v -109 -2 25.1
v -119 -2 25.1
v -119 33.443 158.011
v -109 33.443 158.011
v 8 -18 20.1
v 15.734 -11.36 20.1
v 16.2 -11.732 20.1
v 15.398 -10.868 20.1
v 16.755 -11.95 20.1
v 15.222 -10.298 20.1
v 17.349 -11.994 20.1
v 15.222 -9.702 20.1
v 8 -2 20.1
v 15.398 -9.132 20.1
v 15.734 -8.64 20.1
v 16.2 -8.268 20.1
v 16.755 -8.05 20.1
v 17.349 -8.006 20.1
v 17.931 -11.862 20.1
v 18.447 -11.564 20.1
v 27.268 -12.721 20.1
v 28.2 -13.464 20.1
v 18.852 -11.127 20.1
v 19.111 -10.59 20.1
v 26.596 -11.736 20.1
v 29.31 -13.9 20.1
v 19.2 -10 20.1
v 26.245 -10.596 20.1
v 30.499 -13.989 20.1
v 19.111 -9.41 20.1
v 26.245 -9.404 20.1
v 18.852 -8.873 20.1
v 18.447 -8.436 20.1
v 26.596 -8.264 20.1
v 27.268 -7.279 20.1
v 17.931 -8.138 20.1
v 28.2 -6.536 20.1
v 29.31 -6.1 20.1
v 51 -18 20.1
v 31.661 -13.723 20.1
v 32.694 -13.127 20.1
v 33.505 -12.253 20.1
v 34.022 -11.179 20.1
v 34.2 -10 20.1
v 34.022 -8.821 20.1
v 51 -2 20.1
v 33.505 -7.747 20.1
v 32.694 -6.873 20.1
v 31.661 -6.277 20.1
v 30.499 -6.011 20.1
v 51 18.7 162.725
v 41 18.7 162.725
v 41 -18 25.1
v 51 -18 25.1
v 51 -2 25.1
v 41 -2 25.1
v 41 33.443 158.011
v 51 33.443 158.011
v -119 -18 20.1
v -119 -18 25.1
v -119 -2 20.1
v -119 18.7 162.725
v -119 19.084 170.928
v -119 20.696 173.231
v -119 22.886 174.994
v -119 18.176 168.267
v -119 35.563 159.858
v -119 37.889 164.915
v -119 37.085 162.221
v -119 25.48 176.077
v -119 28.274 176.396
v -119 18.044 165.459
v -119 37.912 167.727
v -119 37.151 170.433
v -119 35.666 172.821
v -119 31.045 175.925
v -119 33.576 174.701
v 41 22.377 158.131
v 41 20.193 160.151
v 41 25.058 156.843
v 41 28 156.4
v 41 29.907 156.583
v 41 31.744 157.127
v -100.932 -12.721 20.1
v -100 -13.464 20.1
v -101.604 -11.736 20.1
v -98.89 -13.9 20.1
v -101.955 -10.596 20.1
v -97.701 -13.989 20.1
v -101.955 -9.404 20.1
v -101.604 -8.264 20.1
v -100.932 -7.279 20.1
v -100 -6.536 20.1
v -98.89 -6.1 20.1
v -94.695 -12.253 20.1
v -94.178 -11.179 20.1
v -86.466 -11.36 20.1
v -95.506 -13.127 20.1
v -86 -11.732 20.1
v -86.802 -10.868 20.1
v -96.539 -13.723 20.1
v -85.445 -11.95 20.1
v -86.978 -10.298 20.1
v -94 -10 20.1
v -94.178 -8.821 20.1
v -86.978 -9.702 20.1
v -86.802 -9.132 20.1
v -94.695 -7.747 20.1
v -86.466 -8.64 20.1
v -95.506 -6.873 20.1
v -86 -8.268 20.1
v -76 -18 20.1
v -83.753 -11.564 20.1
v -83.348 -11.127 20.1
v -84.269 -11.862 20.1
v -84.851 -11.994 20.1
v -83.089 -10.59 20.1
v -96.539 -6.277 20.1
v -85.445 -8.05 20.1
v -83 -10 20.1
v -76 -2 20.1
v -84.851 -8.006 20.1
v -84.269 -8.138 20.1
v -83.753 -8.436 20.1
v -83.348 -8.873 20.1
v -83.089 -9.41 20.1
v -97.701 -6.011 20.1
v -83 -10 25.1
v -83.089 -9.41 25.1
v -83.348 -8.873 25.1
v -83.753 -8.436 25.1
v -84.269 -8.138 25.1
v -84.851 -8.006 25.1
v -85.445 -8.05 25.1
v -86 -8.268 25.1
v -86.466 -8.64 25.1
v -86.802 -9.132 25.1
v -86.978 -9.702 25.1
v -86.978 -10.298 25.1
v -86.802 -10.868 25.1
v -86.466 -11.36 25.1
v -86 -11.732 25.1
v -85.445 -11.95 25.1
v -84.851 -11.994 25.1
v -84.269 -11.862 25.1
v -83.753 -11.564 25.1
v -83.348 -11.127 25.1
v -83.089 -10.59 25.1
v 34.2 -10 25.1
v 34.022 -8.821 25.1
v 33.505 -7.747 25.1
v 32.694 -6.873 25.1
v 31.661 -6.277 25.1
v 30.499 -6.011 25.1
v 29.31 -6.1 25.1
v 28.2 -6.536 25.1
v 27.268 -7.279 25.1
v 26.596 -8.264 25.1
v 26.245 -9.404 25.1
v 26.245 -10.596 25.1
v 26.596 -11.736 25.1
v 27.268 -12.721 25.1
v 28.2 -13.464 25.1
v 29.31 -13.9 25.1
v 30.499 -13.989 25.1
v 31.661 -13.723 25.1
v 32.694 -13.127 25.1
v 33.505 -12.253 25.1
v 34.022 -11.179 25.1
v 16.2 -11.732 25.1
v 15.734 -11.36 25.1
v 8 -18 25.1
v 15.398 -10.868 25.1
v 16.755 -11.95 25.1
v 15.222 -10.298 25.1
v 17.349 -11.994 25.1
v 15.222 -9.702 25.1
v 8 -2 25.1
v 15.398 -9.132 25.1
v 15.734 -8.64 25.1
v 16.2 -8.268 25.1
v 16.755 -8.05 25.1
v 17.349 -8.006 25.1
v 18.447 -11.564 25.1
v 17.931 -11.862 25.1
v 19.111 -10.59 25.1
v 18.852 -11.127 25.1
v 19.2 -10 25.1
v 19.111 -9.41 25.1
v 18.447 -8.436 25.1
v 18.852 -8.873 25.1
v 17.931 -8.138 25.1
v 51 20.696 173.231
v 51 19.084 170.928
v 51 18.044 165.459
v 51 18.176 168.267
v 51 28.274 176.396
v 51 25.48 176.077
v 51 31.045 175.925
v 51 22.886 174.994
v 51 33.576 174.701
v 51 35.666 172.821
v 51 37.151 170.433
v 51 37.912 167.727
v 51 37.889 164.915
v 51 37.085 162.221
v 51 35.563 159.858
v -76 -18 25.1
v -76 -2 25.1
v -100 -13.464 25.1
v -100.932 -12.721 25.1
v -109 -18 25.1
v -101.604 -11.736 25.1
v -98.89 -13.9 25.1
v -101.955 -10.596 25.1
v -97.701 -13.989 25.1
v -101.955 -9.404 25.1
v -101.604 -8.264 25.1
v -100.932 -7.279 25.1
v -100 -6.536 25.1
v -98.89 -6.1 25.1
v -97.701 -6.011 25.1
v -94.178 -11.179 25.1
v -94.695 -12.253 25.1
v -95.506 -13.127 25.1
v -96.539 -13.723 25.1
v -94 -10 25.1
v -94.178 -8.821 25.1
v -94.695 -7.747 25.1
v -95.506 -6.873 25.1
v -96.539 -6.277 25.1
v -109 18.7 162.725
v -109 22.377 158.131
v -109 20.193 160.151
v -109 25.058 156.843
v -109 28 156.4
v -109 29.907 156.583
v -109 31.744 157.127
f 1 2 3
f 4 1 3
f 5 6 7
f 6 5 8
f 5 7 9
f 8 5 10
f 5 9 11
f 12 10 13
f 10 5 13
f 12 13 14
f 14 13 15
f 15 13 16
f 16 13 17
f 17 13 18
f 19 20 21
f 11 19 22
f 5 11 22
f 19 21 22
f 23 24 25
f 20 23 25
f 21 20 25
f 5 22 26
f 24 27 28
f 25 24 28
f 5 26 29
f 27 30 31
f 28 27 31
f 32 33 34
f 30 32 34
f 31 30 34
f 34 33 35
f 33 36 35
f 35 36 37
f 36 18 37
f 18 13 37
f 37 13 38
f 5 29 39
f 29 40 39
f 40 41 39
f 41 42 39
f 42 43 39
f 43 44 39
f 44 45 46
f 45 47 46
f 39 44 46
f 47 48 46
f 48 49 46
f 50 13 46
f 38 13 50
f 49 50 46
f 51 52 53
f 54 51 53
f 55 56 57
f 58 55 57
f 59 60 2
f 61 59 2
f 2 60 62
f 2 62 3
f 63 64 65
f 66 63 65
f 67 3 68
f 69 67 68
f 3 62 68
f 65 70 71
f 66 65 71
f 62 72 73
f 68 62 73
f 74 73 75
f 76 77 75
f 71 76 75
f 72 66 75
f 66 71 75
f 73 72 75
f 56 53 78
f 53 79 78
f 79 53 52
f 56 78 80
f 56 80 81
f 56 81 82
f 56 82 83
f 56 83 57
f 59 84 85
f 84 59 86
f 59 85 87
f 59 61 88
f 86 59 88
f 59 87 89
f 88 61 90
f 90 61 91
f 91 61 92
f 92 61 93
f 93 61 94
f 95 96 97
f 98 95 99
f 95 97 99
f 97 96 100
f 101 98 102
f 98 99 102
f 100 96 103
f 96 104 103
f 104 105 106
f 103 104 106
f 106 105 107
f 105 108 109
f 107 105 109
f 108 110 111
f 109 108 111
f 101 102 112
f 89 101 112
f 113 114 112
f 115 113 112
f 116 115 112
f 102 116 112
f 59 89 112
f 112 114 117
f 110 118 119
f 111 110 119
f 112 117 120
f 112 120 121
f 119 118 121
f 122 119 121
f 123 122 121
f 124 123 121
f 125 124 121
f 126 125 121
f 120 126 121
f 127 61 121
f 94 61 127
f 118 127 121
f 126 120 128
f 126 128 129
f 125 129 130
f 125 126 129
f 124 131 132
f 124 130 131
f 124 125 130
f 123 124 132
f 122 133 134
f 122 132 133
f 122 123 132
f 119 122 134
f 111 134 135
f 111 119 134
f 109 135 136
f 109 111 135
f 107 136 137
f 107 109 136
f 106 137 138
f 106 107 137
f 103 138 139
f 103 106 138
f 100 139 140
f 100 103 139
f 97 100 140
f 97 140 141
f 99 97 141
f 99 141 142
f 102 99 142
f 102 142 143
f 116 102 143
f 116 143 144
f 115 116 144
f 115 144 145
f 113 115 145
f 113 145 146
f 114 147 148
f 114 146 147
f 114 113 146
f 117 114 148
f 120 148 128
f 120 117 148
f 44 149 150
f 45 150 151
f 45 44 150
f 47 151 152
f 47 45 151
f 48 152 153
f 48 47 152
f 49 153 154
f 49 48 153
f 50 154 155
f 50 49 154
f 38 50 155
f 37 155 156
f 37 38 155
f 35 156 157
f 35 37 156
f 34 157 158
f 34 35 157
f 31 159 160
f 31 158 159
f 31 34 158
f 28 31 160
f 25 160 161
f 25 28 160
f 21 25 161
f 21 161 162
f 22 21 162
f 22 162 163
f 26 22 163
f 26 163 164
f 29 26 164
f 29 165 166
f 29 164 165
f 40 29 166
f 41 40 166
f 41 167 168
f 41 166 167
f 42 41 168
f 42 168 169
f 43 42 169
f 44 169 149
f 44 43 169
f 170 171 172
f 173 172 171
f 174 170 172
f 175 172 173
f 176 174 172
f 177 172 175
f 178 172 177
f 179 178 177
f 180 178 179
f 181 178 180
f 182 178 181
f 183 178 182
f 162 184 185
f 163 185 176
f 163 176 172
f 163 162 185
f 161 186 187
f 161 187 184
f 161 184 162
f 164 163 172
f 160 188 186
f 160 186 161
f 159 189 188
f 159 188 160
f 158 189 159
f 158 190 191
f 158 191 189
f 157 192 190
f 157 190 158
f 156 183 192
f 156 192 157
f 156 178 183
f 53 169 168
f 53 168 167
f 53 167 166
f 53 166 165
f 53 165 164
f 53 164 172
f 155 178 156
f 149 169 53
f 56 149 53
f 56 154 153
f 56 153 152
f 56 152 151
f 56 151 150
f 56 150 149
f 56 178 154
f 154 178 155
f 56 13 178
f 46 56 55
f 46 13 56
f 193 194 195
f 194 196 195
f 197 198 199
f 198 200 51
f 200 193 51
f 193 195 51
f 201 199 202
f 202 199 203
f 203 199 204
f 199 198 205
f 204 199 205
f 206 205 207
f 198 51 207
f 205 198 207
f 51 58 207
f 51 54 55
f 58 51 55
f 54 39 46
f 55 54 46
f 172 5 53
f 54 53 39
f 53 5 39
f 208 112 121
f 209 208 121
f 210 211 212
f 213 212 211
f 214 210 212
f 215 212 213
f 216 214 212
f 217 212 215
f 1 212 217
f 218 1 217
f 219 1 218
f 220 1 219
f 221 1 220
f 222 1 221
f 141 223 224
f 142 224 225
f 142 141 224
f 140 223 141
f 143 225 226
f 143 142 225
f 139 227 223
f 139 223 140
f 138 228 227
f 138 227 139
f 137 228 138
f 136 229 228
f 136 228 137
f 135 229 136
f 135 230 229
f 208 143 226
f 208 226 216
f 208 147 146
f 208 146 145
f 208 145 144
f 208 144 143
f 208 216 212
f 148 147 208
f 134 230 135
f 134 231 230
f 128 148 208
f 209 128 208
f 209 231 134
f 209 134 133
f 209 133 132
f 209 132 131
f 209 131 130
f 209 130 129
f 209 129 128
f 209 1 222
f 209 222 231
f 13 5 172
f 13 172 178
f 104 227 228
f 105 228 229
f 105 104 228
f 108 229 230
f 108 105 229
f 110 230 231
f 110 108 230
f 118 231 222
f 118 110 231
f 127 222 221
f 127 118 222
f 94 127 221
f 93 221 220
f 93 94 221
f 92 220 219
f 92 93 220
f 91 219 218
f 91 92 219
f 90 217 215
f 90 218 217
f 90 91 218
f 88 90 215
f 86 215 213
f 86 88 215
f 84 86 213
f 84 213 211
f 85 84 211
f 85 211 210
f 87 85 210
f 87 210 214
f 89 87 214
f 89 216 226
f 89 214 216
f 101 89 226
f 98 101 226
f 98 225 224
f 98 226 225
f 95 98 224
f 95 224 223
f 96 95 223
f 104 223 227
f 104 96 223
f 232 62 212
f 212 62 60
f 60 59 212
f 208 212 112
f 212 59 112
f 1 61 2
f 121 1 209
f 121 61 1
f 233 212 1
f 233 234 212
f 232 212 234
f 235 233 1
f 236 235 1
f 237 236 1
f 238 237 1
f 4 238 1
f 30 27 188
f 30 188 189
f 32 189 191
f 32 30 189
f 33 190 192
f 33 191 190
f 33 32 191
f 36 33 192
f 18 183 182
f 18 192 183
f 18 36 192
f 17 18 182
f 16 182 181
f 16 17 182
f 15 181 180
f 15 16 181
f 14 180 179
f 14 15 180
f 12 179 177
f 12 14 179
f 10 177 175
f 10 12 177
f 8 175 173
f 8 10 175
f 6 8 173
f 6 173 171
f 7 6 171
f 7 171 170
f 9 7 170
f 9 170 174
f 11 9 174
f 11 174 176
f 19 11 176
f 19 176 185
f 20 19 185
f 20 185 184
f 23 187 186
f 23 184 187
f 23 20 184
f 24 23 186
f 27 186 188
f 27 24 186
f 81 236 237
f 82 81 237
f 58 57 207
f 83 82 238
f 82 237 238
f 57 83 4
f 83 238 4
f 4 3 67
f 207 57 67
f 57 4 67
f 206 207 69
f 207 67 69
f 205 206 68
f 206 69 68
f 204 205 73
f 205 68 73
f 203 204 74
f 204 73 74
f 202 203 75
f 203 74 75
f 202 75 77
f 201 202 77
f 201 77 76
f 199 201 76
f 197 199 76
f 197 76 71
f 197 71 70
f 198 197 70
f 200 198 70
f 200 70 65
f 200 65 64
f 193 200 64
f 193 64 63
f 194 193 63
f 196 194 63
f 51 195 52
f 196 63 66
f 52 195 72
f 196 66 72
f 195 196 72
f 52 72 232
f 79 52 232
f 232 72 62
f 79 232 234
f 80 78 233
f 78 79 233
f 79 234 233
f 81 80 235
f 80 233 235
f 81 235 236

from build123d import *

# Parameters (mm, degrees)
CYLINDER127_R             = 10
CYLINDER127_DEPTH         = 170
EXTRUDE010_DEPTH          = 10
FILLET003_R               = 7.72
FILLET003_ROLL_ANGLE      = 90
FILLET003_PLACEMENT_ANGLE = 90
EXTRUDE009_DEPTH          = 10
FILLET002_R               = 7.72
FILLET002_ROLL_ANGLE      = 90
FILLET002_PLACEMENT_ANGLE = 90
CYLINDER237_R             = 2
CYLINDER237_DEPTH         = 42
CYLINDER033_R             = 4
CYLINDER033_DEPTH         = 32
BOX309_W                  = 43
BOX309_H                  = 16
BOX309_DEPTH              = 5
CYLINDER236_R             = 2
CYLINDER236_DEPTH         = 42
CYLINDER034_R             = 4
CYLINDER034_DEPTH         = 32
BOX310_W                  = 43
BOX310_H                  = 16
BOX310_DEPTH              = 5


with BuildPart() as cylinder127:
    # Cylinder127 → Cylinder127 (new body)
    with BuildSketch(Plane(origin=(-119, 28, 146.3), x_dir=(0, 0, -1), z_dir=(1, 0, 0))):
        Circle(CYLINDER127_R)
    extrude(amount=CYLINDER127_DEPTH)


with BuildPart() as fillet003:
    # Wire005 → Extrude010 (new body)
    with BuildSketch(Plane.XY):
        Polygon((0, 0), (16, 0), (56, 150), (40, 150), align=None)
    extrude(amount=EXTRUDE010_DEPTH)

    # Fillet003
    fillet003_edges = [fillet003.edges().sort_by_distance(p)[0] for p in [
        (56, 150, 5),
        (40, 150, 5),
    ]]
    fillet(fillet003_edges, radius=FILLET003_R)


with BuildPart() as fillet003_1:
    # Fillet003 roll: moved
    add(fillet003.part.rotate(Axis((0, 0, 0), (1, 0, 0)), FILLET003_ROLL_ANGLE))


with BuildPart() as fillet003_2:
    # Fillet003 placement: moved
    add(fillet003_1.part.moved(Location((-119, -18, 5))).rotate(Axis((-119, -18, 5), (0, 0, 1)), FILLET003_PLACEMENT_ANGLE))


with BuildPart() as fusion167:
    # Wire004 → Extrude009 (new body)
    with BuildSketch(Plane.XY):
        Polygon((0, 0), (16, 0), (56, 150), (40, 150), align=None)
    extrude(amount=EXTRUDE009_DEPTH)

    # Fillet002
    fillet002_edges = [fusion167.edges().sort_by_distance(p)[0] for p in [
        (56, 150, 5),
        (40, 150, 5),
    ]]
    fillet(fillet002_edges, radius=FILLET002_R)


with BuildPart() as fusion167_1:
    # Fillet002 roll: moved
    add(fusion167.part.rotate(Axis((0, 0, 0), (1, 0, 0)), FILLET002_ROLL_ANGLE))


with BuildPart() as fusion167_2:
    # Fillet002 placement: moved
    add(fusion167_1.part.moved(Location((41, -18, 5))).rotate(Axis((41, -18, 5), (0, 0, 1)), FILLET002_PLACEMENT_ANGLE))

    # Fusion167: union Cylinder127, Fillet003
    add(cylinder127.part)
    add(fillet003_2.part)


with BuildPart() as cylinder237:
    # Cylinder237 → Cylinder237 (new body)
    with BuildSketch(Plane(origin=(17.2, -10, -5), x_dir=(1, 0, 0), z_dir=(0, 0, 1))):
        Circle(CYLINDER237_R)
    extrude(amount=CYLINDER237_DEPTH)


with BuildPart() as cylinder033:
    # Cylinder033 → Cylinder033 (new body)
    with BuildSketch(Plane(origin=(30.2, -10, 0), x_dir=(1, 0, 0), z_dir=(0, 0, 1))):
        Circle(CYLINDER033_R)
    extrude(amount=CYLINDER033_DEPTH)


with BuildPart() as cut203:
    # Box309 → Box309 (new body)
    with BuildSketch(Plane(origin=(8, -18, 0), x_dir=(1, 0, 0), z_dir=(0, 0, 1))):
        with Locations((21.5, 8)):
            Rectangle(BOX309_W, BOX309_H)
    extrude(amount=BOX309_DEPTH)

    # Cut187: cut Cylinder033
    add(cylinder033.part, mode=Mode.SUBTRACT)

    # Cut203: cut Cylinder237
    add(cylinder237.part, mode=Mode.SUBTRACT)


with BuildPart() as cylinder236:
    # Cylinder236 → Cylinder236 (new body)
    with BuildSketch(Plane(origin=(-85, -10, -5), x_dir=(1, 0, 0), z_dir=(0, 0, 1))):
        Circle(CYLINDER236_R)
    extrude(amount=CYLINDER236_DEPTH)


with BuildPart() as cylinder034:
    # Cylinder034 → Cylinder034 (new body)
    with BuildSketch(Plane(origin=(-98, -10, 0), x_dir=(1, 0, 0), z_dir=(0, 0, 1))):
        Circle(CYLINDER034_R)
    extrude(amount=CYLINDER034_DEPTH)


with BuildPart() as fusion169:
    # Box310 → Box310 (new body)
    with BuildSketch(Plane(origin=(-119, -18, 0), x_dir=(1, 0, 0), z_dir=(0, 0, 1))):
        with Locations((21.5, 8)):
            Rectangle(BOX310_W, BOX310_H)
    extrude(amount=BOX310_DEPTH)

    # Cut183: cut Cylinder034
    add(cylinder034.part, mode=Mode.SUBTRACT)

    # Cut202: cut Cylinder236
    add(cylinder236.part, mode=Mode.SUBTRACT)

    # Fusion169: union Fusion167, Cut203
    add(fusion167_2.part)
    add(cut203.part)


with BuildPart() as fusion169_1:
    # Fusion169 placement: moved
    add(fusion169.part.moved(Location((0, 0, 20.1))))


solid = fusion169_1.part
